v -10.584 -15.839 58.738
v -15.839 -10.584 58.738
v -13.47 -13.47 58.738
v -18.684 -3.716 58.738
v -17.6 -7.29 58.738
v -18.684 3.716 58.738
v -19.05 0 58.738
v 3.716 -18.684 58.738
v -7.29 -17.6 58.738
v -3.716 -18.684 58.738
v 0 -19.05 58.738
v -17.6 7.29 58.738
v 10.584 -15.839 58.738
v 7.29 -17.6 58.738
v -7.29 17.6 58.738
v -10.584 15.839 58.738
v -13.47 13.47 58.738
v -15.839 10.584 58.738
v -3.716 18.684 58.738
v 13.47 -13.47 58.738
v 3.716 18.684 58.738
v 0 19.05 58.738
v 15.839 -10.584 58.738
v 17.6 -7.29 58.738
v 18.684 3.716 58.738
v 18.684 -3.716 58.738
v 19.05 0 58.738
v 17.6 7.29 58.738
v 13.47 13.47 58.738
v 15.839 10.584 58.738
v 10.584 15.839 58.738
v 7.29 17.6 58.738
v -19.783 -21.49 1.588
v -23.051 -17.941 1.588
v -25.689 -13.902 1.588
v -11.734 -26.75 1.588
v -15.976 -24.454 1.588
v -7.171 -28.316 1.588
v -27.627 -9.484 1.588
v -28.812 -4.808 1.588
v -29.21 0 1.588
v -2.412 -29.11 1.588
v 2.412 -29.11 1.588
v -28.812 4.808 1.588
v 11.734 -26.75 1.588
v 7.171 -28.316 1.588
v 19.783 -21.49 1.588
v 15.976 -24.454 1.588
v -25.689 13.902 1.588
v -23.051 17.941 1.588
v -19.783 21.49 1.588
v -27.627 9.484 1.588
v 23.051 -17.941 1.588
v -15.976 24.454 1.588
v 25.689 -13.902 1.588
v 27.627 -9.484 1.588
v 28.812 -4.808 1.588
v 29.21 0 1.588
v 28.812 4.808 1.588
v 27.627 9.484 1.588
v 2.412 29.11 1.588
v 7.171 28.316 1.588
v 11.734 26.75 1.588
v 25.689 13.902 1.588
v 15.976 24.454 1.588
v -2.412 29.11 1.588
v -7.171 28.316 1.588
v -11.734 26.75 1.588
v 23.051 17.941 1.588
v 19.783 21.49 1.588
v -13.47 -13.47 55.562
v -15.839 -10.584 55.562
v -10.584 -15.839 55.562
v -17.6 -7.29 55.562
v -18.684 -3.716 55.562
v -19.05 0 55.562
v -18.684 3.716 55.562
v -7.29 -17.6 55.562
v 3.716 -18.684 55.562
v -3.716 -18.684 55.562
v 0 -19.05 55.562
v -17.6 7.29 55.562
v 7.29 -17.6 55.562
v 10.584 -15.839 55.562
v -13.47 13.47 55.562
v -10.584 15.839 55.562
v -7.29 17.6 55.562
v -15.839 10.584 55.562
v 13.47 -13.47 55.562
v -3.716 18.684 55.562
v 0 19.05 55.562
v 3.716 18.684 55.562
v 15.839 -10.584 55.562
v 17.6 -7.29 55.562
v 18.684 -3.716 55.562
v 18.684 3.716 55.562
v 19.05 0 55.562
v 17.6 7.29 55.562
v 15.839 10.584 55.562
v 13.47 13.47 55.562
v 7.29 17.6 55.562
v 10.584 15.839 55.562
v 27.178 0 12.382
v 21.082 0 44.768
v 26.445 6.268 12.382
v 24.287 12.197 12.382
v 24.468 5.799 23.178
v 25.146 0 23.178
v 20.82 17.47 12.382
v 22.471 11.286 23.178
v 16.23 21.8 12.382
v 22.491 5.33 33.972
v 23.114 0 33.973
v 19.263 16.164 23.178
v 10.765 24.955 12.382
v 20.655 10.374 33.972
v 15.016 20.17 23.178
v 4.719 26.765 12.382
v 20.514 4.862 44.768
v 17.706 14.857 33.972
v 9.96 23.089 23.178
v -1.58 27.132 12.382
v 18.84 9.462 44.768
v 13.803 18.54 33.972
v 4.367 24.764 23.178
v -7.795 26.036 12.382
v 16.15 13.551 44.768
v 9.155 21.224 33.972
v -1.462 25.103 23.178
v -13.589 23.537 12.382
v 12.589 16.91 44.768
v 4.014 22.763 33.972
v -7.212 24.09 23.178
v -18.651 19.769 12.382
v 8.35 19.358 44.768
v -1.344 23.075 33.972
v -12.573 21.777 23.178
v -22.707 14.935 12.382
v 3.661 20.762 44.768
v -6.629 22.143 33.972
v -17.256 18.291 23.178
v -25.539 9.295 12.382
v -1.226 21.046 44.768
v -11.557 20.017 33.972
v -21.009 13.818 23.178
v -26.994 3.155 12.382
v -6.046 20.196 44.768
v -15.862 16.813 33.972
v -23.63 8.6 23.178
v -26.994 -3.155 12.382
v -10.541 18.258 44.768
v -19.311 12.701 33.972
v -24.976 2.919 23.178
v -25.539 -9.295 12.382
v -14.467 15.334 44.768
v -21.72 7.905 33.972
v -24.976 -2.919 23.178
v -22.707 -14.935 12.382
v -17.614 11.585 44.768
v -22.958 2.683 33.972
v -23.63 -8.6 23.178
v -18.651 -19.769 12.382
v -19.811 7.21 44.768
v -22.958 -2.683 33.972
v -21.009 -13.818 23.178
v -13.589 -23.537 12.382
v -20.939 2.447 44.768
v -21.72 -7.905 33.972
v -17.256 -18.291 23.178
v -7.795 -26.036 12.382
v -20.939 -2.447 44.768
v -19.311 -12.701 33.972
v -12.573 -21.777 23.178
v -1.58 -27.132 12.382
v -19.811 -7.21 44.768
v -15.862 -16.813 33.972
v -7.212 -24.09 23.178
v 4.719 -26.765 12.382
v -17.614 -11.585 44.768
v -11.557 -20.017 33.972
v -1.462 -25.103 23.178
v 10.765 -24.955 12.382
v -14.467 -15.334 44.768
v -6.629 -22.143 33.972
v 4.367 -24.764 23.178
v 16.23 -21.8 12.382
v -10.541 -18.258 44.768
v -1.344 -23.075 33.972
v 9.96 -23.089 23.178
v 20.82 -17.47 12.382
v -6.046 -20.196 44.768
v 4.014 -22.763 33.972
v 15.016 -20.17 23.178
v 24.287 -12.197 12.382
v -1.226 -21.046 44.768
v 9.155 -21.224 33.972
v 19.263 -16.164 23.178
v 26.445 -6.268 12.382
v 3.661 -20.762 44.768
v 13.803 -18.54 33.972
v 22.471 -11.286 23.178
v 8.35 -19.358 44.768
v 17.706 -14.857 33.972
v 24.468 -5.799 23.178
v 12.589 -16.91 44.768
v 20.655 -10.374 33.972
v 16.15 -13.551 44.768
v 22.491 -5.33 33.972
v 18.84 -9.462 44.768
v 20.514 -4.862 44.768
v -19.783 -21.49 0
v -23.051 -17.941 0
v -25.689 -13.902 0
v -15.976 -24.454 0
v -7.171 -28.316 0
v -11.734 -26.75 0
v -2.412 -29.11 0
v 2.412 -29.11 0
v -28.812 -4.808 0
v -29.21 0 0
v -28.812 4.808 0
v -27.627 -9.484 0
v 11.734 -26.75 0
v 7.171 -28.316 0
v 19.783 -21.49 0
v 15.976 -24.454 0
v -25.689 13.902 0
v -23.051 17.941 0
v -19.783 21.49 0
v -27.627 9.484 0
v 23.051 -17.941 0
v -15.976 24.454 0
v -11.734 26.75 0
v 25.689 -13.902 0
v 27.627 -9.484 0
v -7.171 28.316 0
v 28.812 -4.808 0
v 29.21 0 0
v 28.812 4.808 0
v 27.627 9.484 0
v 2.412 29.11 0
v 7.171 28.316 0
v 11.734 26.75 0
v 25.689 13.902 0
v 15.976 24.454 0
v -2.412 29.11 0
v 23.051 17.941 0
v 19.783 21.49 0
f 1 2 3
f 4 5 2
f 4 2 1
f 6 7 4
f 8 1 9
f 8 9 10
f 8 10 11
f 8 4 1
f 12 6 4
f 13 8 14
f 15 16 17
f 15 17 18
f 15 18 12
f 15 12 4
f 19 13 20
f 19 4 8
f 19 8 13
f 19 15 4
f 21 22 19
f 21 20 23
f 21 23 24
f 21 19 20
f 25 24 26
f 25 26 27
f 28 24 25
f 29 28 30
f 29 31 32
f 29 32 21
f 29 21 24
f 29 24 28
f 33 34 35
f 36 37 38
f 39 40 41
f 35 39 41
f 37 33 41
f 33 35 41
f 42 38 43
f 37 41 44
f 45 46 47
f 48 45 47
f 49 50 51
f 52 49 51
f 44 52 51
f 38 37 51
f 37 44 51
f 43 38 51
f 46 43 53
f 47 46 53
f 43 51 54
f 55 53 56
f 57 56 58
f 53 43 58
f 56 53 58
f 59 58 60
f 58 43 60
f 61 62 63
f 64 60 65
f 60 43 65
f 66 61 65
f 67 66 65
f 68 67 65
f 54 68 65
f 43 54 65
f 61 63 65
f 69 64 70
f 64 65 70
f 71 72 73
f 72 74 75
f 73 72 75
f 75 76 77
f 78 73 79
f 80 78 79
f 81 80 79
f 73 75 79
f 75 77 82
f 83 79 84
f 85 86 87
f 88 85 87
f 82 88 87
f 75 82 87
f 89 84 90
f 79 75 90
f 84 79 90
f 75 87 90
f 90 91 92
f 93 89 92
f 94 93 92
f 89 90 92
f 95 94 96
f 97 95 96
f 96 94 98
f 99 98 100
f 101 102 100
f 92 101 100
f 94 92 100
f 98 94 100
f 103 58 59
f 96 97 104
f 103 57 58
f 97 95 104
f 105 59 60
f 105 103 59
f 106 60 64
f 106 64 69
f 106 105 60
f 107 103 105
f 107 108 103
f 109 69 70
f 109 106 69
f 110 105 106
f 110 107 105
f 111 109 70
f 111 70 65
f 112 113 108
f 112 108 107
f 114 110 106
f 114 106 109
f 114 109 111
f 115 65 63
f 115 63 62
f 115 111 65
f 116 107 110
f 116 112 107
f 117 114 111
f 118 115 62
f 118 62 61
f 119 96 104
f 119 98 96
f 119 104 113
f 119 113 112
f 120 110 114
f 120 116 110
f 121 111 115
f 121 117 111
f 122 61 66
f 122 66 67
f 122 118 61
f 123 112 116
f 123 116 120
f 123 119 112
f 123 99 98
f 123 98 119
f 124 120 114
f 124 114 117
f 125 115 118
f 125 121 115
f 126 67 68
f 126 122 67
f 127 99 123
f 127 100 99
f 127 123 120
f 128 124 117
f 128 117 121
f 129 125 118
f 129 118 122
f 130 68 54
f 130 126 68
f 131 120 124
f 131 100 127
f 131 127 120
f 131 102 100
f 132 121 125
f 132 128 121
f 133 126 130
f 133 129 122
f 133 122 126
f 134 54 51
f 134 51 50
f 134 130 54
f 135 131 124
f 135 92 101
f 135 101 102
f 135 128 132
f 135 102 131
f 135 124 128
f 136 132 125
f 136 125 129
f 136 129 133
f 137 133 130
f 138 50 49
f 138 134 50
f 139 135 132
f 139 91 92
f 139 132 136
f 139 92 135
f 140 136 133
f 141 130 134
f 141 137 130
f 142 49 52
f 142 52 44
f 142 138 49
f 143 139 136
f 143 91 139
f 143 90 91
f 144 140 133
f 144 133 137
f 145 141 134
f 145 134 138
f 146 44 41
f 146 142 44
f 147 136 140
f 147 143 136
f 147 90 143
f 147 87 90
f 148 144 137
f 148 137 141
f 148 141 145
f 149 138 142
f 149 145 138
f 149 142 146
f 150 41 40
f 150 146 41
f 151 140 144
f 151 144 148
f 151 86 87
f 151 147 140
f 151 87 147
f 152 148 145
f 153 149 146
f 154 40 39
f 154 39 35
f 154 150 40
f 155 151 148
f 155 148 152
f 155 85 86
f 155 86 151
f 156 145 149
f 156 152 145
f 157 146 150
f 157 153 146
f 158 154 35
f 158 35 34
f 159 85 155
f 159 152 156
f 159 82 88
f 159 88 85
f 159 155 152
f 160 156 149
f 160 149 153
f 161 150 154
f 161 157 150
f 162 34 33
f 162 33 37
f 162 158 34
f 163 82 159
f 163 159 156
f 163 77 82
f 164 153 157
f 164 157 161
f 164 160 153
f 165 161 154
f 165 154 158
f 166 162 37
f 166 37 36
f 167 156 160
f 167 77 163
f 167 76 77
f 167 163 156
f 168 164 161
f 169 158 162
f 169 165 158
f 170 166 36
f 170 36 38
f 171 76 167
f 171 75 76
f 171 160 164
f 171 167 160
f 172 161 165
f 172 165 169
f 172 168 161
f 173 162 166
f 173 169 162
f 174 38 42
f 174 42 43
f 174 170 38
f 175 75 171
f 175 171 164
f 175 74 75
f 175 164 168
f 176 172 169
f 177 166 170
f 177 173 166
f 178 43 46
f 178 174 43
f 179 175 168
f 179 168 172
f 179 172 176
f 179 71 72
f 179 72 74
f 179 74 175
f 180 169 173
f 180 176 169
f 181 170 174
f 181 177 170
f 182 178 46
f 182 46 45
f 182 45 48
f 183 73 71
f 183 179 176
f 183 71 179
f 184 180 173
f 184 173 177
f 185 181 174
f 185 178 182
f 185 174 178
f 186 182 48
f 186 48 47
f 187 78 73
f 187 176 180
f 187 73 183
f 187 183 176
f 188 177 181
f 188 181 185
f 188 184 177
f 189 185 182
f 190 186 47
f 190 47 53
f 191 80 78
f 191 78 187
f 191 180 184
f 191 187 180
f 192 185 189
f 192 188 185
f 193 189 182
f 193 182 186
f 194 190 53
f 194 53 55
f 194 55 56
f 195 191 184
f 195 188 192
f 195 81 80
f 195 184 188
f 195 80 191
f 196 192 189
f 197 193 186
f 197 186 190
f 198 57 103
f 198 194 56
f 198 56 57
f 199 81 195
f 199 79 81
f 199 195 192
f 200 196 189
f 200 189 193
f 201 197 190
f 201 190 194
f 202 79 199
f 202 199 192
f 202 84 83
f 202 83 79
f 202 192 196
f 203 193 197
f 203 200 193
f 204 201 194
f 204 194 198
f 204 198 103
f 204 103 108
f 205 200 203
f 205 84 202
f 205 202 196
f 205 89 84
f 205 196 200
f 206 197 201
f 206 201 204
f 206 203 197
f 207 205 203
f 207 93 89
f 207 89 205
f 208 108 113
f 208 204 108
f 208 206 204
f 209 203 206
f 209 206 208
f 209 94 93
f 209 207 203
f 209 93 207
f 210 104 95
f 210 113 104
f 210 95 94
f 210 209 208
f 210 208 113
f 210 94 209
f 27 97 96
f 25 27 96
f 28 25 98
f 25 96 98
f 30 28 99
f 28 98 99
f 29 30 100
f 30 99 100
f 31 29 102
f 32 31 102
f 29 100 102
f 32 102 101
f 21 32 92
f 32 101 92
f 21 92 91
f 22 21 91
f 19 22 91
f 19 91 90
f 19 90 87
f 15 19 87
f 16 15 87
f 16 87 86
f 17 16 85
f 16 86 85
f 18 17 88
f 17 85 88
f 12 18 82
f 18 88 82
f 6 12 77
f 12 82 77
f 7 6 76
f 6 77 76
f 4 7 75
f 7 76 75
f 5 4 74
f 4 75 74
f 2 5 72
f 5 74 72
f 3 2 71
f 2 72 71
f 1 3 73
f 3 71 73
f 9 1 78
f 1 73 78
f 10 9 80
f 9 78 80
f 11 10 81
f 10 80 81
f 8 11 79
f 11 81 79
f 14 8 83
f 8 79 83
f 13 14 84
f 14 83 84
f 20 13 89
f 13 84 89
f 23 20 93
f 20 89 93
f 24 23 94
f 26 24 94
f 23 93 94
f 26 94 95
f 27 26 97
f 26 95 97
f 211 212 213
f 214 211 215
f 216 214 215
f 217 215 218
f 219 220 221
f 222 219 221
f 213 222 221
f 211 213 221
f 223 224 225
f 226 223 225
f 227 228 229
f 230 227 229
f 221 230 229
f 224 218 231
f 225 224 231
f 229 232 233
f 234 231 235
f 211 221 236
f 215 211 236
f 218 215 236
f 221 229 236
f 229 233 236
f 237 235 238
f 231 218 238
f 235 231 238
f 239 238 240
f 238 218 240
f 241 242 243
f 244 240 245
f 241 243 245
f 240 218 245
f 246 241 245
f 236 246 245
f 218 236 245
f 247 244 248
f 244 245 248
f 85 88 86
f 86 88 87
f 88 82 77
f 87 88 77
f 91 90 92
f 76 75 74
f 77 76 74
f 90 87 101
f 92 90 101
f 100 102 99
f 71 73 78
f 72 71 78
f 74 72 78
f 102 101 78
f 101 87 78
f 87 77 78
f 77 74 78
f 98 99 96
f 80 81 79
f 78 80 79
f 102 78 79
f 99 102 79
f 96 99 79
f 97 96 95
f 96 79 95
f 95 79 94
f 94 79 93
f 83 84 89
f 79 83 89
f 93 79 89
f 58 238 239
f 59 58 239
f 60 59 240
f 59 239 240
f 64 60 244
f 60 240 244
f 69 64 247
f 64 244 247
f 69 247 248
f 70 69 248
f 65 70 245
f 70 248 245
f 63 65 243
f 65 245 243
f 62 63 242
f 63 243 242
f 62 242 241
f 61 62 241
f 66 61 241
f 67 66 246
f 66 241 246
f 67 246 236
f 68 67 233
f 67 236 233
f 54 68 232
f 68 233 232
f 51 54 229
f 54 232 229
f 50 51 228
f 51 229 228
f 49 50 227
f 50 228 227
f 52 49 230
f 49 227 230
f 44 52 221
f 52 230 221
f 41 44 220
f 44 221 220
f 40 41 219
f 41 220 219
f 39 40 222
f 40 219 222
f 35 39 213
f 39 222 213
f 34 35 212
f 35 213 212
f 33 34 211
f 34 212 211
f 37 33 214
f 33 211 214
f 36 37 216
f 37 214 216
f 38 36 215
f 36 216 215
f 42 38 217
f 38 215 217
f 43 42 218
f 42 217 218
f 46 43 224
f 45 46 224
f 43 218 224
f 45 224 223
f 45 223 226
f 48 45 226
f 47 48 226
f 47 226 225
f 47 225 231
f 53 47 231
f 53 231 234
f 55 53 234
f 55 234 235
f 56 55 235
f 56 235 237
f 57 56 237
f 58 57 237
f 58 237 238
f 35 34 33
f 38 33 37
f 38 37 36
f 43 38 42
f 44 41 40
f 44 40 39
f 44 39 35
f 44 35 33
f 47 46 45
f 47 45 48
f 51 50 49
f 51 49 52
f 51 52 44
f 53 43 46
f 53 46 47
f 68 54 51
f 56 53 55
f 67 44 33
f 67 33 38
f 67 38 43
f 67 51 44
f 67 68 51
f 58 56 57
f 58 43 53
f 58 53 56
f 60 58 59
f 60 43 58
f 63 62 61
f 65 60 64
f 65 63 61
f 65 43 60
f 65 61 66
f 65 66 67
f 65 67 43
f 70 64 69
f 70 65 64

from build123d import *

# Parameters (mm, degrees)
F0_R      = 29.21
F1_DEPTH  = 1.5875
F3_R      = 19.05
F4_DEPTH  = 3.175
F1_FACE_R = 29.21
F4_FACE_R = 19.05


with BuildPart() as f1:
    # F0 (on Top) → F1 (new body)
    with BuildSketch(Plane.XY):
        Circle(F0_R)
    extrude(amount=F1_DEPTH)


with BuildPart() as f4:
    # F3 (on offset) → F4 (new body)
    with BuildSketch(Plane.XY.offset(55.5625)):
        Circle(F3_R)
    extrude(amount=F4_DEPTH)


with BuildPart() as f5:
    # F1_face (on face) → F5 section 0
    with BuildSketch(Plane.XY.offset(1.5875)):
        Circle(F1_FACE_R)
    # F4_face (on face) → F5 section 1
    with BuildSketch(Plane(origin=(0, 0, 55.5625), x_dir=(1, 0, 0), z_dir=(0, 0, -1))):
        Circle(F4_FACE_R)
    loft()


solid = Compound([f1.part, f4.part, f5.part])
